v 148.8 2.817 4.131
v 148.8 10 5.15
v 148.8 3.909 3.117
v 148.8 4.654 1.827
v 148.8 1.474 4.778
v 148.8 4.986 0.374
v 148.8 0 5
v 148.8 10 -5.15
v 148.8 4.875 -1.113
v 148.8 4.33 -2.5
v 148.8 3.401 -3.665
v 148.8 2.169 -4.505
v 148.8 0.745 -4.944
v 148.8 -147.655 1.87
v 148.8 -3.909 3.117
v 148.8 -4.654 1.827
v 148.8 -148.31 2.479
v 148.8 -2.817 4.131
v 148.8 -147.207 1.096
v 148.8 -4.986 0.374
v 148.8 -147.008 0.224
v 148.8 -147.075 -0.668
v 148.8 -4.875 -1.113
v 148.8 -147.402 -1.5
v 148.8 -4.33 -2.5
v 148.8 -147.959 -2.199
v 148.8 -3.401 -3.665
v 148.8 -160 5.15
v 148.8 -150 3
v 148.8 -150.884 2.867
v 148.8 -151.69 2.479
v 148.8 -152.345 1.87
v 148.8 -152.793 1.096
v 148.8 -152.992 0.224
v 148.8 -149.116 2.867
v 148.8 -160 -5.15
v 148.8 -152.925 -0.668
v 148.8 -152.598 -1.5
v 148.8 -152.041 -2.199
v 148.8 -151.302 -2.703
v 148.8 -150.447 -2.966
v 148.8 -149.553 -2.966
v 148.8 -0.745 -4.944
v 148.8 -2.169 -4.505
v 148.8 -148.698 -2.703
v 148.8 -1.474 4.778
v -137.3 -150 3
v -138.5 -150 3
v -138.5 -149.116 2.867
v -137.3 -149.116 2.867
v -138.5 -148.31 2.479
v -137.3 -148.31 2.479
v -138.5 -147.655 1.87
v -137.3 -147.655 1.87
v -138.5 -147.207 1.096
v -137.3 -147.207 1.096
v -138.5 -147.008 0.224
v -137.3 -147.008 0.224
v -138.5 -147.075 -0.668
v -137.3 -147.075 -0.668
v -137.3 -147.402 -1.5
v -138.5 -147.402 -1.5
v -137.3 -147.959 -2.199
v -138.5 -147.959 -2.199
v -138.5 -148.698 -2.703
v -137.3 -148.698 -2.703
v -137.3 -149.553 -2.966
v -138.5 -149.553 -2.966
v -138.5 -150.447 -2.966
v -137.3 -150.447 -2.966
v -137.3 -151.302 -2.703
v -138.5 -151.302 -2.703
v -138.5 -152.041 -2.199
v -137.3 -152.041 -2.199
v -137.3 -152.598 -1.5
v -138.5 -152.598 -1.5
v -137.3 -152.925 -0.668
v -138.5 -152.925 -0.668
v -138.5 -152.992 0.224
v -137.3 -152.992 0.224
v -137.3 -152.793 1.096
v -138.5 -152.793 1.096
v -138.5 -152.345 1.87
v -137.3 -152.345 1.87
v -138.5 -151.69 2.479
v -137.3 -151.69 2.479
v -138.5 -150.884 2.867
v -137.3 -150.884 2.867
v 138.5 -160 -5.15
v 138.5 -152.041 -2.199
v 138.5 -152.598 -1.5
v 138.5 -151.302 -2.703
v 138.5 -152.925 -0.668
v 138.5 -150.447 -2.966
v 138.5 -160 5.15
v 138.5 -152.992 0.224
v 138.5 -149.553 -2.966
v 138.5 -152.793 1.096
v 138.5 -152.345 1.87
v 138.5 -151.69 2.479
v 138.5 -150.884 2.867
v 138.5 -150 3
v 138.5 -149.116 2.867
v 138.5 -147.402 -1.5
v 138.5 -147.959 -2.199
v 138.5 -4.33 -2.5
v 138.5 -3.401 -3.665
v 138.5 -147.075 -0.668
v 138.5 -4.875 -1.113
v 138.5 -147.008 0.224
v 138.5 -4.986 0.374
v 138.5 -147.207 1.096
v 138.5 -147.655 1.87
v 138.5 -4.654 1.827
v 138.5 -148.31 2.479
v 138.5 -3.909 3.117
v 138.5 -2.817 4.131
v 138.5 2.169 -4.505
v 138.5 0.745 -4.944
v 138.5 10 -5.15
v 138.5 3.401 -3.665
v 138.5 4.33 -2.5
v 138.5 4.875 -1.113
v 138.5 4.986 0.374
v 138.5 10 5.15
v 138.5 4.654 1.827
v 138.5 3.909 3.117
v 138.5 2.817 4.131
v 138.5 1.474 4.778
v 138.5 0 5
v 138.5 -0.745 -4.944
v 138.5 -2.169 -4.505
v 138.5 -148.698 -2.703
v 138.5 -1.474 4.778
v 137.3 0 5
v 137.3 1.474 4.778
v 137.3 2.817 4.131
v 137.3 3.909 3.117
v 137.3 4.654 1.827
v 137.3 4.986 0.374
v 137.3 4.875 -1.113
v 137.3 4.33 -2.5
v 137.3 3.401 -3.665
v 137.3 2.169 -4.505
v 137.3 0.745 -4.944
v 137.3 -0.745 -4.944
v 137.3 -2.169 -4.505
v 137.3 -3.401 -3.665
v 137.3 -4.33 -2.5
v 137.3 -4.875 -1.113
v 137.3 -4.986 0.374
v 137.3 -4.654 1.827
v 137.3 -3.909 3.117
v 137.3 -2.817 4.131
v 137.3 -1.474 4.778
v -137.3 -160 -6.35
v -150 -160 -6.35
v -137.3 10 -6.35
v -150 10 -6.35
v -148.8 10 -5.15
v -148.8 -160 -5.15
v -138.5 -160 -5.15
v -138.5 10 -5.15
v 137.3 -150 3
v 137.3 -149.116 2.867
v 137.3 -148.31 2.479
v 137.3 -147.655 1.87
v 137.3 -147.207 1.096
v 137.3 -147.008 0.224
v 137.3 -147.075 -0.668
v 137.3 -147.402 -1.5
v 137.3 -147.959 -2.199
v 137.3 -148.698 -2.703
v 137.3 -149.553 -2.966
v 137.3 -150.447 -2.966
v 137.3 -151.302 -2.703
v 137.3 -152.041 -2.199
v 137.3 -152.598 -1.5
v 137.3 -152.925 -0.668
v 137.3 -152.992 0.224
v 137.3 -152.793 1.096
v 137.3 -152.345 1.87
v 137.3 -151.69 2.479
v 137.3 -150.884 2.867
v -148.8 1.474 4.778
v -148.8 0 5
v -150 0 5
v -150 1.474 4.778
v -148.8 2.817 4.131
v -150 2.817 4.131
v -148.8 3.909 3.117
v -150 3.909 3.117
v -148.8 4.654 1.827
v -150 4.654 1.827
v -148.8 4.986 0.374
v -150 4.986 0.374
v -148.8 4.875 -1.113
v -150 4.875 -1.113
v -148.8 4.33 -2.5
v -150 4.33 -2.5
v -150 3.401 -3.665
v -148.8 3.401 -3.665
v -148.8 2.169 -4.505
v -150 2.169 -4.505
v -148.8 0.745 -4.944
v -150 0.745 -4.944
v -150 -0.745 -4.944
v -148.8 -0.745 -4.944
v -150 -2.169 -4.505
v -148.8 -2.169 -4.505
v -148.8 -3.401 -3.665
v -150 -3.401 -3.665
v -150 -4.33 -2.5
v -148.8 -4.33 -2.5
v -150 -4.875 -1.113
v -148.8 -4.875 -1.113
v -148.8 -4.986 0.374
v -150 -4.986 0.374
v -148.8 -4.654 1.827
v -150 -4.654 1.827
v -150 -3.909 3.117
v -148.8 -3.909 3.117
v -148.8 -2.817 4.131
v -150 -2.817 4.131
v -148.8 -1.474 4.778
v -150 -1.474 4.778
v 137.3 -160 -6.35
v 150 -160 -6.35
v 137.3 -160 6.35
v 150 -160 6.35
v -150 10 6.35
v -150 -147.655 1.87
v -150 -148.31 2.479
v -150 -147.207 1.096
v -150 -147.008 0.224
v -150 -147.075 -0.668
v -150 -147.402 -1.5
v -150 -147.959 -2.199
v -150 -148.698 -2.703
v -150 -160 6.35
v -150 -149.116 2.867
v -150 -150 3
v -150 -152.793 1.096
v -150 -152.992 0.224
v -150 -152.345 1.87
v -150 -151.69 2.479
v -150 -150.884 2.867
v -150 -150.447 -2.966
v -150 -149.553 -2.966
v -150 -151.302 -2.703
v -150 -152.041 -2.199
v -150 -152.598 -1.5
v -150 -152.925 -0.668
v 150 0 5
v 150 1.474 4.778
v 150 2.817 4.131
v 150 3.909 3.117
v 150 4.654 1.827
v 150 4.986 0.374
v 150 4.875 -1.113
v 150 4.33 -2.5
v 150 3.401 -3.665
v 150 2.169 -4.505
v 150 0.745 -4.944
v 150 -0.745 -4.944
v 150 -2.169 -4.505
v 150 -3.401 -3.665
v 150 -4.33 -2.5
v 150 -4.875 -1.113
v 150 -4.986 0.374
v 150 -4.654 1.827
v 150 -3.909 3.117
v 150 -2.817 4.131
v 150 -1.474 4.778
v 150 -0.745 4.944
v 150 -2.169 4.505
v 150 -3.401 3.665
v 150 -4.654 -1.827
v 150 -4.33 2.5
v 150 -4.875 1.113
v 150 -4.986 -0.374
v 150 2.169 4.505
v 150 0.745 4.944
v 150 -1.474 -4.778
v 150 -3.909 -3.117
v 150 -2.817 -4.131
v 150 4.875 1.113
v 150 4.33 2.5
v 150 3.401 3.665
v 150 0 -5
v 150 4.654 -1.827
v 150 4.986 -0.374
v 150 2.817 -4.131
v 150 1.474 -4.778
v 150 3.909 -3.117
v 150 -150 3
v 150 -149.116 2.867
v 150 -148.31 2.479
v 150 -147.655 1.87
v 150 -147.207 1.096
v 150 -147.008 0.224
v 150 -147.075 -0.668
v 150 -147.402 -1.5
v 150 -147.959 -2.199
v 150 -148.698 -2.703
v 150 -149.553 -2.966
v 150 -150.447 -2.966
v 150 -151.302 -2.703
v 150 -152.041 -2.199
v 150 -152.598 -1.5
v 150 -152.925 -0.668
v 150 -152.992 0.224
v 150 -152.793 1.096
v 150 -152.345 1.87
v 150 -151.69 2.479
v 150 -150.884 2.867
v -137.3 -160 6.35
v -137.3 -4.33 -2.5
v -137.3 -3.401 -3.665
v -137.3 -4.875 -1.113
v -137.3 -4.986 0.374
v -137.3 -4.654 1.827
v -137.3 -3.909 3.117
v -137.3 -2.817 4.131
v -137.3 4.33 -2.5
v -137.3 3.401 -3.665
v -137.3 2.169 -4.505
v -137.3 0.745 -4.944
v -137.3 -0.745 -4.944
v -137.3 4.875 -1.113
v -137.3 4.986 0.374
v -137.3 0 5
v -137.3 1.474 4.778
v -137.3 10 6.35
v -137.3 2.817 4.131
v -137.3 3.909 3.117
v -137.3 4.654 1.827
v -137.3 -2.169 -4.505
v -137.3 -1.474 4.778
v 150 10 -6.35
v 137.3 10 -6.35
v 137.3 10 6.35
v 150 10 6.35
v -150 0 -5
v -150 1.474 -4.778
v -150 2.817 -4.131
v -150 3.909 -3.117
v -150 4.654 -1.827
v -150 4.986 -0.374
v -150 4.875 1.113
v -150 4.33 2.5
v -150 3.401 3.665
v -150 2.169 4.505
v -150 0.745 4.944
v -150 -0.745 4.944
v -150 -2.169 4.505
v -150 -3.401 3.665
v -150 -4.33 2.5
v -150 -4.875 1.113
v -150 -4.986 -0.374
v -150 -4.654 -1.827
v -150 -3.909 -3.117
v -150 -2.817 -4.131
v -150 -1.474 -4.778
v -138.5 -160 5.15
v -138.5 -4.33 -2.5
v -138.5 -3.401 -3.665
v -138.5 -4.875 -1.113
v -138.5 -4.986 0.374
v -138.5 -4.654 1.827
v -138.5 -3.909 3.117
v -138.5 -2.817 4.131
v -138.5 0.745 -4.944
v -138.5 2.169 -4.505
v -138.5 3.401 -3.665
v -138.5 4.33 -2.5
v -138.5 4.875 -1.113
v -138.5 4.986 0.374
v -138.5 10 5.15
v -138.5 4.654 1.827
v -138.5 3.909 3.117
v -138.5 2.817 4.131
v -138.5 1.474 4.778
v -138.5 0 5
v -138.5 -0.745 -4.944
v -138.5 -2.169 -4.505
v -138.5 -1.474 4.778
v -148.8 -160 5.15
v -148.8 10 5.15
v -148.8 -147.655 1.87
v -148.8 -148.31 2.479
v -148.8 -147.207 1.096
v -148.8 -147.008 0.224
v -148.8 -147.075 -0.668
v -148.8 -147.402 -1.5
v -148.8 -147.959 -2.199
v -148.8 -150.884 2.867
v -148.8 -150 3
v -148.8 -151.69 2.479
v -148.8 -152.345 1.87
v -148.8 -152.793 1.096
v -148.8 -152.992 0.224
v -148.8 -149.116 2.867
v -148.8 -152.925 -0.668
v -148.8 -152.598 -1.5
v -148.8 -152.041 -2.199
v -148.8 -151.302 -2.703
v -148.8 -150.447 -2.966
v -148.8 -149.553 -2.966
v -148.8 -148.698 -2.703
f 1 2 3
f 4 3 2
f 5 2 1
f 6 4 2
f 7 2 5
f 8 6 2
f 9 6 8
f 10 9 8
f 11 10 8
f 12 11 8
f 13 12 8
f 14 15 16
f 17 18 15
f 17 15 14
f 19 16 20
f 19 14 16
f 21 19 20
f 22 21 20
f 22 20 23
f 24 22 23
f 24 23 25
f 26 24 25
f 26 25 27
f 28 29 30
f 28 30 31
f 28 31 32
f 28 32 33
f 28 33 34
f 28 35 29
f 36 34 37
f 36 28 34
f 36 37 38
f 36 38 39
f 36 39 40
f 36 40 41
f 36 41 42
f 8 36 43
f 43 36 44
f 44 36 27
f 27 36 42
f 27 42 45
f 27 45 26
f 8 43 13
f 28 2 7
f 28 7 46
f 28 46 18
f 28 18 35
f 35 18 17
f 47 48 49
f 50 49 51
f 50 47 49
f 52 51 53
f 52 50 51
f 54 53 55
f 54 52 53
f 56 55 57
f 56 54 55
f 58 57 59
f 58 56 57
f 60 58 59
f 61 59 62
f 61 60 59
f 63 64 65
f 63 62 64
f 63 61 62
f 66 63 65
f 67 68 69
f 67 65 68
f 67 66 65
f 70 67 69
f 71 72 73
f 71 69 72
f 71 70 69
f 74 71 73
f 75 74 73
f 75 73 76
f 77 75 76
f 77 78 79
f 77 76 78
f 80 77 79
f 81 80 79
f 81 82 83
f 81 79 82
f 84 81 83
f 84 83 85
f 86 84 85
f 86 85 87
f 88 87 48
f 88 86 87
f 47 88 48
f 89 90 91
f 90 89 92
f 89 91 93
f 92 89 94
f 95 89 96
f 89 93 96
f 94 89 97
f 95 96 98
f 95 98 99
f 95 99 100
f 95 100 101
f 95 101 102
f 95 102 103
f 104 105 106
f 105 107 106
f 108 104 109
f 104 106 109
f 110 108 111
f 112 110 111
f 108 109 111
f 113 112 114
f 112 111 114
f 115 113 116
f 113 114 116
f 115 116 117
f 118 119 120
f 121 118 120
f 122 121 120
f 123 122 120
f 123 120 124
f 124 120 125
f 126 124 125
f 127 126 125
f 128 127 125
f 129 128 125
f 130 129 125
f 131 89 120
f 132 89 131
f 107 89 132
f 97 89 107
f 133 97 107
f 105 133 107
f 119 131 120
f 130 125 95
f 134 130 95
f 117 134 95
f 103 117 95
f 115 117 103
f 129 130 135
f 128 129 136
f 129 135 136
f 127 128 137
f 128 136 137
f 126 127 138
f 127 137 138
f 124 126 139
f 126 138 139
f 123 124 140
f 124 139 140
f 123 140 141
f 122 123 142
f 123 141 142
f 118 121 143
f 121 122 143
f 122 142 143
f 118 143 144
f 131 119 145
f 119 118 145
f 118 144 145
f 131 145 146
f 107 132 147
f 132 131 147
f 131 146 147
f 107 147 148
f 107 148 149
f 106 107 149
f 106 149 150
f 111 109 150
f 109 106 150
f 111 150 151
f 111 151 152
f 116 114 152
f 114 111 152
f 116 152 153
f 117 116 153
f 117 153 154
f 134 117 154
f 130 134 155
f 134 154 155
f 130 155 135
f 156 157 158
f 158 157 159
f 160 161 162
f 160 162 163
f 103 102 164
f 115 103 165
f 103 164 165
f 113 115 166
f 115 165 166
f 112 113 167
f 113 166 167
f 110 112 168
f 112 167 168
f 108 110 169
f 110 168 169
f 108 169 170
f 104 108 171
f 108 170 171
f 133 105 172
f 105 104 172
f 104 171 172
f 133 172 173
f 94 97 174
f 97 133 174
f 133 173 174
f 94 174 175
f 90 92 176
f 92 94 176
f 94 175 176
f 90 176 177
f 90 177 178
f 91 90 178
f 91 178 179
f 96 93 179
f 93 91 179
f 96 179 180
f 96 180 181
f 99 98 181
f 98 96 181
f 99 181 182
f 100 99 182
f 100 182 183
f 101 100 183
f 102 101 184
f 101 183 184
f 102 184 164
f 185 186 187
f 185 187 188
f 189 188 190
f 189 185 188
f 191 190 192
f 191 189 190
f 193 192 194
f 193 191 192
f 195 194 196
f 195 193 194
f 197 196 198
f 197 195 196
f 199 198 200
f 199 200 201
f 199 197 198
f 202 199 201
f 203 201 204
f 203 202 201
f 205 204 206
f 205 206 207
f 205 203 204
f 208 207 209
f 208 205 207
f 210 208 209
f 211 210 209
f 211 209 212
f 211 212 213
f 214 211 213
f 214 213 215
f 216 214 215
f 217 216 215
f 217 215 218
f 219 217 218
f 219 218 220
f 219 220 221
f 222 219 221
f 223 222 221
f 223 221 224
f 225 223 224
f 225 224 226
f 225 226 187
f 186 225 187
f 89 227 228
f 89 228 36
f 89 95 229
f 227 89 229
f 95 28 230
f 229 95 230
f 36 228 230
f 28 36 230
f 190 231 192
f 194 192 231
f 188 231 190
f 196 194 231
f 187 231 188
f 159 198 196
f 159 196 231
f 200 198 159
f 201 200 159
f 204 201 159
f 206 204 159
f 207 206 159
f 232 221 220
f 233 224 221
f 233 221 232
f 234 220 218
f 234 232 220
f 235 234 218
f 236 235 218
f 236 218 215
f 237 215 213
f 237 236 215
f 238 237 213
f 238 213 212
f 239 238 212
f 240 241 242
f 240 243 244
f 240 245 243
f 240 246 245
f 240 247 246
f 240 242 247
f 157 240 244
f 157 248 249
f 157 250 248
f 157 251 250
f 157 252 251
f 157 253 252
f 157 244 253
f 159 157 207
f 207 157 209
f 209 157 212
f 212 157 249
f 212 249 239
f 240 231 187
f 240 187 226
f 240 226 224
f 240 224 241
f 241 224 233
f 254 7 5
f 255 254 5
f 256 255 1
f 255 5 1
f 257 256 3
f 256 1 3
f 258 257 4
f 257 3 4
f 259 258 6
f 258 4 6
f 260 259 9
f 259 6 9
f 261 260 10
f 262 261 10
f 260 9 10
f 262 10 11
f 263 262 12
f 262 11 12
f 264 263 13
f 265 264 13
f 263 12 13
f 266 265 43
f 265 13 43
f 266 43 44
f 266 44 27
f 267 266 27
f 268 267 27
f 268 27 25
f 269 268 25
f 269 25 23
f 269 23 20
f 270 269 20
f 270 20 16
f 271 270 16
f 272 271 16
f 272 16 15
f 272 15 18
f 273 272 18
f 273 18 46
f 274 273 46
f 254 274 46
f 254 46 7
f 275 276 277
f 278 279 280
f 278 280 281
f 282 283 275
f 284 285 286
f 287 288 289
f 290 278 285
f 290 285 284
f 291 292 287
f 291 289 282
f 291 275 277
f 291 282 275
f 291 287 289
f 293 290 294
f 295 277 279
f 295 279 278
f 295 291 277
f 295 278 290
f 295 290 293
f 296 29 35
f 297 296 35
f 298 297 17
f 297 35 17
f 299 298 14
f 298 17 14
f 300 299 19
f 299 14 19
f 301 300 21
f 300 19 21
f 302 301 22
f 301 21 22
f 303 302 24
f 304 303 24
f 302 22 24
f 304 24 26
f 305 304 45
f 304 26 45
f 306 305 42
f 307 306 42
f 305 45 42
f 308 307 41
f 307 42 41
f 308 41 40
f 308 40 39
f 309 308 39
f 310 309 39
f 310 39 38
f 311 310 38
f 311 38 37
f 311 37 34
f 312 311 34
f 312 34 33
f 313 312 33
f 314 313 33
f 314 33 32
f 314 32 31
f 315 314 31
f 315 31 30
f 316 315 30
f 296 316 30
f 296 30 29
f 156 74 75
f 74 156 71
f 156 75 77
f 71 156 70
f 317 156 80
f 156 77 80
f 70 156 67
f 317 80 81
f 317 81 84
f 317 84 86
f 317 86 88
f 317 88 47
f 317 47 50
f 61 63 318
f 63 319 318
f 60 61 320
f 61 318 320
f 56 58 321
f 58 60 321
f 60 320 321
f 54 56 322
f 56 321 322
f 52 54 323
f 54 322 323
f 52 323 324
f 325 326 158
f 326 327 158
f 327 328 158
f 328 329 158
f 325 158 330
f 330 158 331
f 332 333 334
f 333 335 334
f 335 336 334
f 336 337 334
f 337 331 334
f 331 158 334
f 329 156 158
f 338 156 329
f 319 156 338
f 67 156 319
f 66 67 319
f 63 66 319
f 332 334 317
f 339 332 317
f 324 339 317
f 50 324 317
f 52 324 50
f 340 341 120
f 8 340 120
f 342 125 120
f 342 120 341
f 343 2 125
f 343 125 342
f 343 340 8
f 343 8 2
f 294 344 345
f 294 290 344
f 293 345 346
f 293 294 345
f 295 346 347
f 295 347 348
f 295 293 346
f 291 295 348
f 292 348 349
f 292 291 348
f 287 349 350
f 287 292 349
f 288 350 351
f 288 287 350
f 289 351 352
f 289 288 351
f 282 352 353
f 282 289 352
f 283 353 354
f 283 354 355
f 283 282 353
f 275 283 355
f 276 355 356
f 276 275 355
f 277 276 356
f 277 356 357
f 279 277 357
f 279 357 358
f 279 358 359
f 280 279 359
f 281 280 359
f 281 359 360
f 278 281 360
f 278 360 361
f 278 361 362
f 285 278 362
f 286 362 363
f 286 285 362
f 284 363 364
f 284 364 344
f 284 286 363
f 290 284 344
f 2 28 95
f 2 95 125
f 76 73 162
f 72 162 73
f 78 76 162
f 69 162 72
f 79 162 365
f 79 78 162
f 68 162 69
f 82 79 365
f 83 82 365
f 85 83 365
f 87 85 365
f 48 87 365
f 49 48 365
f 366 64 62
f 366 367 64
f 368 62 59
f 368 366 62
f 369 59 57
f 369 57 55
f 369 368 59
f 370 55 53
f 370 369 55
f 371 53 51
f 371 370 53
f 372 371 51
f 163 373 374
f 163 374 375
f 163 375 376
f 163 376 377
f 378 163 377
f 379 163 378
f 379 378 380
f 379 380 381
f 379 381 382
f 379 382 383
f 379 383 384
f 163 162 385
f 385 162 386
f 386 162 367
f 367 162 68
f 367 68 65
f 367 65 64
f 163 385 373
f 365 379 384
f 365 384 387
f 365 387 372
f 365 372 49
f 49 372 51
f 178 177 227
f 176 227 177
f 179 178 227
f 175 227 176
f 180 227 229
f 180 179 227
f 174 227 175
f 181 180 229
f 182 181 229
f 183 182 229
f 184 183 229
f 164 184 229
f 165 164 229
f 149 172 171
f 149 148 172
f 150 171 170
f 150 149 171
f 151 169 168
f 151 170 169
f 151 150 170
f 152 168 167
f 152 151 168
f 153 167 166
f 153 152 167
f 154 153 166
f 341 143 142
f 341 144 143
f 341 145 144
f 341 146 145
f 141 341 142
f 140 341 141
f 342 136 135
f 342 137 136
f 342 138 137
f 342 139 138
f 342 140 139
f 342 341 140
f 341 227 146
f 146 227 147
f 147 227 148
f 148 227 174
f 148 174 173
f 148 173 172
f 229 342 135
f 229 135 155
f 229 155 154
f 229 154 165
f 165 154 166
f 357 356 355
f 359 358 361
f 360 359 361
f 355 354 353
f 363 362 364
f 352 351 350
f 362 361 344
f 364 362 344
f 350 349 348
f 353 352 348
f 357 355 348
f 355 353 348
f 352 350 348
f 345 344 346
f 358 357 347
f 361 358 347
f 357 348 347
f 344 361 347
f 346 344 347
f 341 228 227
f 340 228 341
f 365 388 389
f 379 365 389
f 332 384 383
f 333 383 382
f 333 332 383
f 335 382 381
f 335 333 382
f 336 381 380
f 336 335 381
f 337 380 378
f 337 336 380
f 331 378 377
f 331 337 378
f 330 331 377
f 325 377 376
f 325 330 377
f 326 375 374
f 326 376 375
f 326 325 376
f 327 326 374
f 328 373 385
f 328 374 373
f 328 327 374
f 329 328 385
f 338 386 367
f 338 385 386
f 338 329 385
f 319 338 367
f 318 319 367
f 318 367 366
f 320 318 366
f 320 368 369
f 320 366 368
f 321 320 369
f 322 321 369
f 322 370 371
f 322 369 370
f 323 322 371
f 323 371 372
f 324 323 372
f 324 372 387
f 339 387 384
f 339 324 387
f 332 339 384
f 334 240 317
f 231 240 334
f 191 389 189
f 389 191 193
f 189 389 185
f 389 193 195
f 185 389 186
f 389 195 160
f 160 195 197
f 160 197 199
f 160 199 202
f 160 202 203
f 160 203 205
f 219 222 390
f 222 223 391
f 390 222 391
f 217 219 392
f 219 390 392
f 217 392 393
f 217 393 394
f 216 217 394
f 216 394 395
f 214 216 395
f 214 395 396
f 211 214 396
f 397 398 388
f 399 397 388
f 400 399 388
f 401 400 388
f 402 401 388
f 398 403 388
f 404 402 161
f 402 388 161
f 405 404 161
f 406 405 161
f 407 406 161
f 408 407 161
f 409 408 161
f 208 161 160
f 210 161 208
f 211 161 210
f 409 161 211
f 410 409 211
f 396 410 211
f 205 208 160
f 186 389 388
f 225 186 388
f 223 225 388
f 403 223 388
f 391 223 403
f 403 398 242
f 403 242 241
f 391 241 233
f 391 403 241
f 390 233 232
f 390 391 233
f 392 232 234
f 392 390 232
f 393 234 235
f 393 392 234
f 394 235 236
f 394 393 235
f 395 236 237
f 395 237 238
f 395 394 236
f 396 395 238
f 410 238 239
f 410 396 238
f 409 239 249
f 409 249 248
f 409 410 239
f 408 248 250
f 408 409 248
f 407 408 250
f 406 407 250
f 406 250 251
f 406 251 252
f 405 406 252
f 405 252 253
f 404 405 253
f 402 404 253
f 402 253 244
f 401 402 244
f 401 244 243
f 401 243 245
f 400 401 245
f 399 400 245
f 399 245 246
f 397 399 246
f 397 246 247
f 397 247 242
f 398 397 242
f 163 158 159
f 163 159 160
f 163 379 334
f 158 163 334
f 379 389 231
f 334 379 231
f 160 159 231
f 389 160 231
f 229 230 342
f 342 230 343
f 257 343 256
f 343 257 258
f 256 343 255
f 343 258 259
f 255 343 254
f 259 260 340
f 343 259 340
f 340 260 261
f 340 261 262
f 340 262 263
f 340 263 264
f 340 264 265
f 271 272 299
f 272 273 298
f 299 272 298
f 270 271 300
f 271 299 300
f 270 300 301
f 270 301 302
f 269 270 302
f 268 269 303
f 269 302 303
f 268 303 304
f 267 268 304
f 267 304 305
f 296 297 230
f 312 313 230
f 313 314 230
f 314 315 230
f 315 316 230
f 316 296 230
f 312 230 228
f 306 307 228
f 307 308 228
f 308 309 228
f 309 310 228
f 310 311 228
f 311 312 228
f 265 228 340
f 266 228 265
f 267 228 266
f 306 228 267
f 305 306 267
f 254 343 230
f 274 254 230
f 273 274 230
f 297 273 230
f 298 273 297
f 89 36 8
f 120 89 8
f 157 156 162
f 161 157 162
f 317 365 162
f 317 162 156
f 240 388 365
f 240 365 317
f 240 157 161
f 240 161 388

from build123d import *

# Parameters (mm, degrees)
SKETCH1_R           = 5
BOSS_EXTRUDE1_DEPTH = 150
SKETCH2_W           = 12.7
SKETCH2_H           = 170
BOSS_EXTRUDE2_DEPTH = 12.7
SHELL1_T            = -1.2
SKETCH2_3_R         = 3
SKETCH2_3_R_2       = 5
CUT_EXTRUDE1_DEPTH  = 341.059292624


with BuildPart() as part:
    # Sketch1 → Boss-Extrude1 (new, symmetric)
    with BuildSketch(Plane(origin=(0, 0, 0), x_dir=(0, 0, -1), z_dir=(1, 0, 0))):
        Circle(SKETCH1_R)
    extrude(amount=BOSS_EXTRUDE1_DEPTH, both=True)


with BuildPart() as body_2:
    # Sketch2 → Boss-Extrude2 (new body)
    with BuildSketch(Plane.ZY.offset(150)):
        with Locations((0, -75)):
            Rectangle(SKETCH2_W, SKETCH2_H)
    extrude(amount=-BOSS_EXTRUDE2_DEPTH)

    # Shell1
    shell1_openings = [body_2.faces().sort_by_distance(p)[0] for p in [
        (-143.65, 10, 0),
        (-143.65, -160, 0),
    ]]
    offset(amount=SHELL1_T, openings=shell1_openings, kind=Kind.INTERSECTION)

    # Sketch2<3> → Cut-Extrude1 (cut, through all)
    with BuildSketch(Plane.ZY.offset(150)):
        with Locations((0, -150)):
            Circle(SKETCH2_3_R)
        Circle(SKETCH2_3_R_2)
    extrude(amount=-CUT_EXTRUDE1_DEPTH, mode=Mode.SUBTRACT)


with BuildPart() as body_3:
    # Mirror1: mirrored copy
    add(body_2.part.mirror(Plane(origin=(0, 0, 0), x_dir=(0, 0, 1), z_dir=(1, 0, 0))))


solid = Compound([part.part, body_2.part, body_3.part])
